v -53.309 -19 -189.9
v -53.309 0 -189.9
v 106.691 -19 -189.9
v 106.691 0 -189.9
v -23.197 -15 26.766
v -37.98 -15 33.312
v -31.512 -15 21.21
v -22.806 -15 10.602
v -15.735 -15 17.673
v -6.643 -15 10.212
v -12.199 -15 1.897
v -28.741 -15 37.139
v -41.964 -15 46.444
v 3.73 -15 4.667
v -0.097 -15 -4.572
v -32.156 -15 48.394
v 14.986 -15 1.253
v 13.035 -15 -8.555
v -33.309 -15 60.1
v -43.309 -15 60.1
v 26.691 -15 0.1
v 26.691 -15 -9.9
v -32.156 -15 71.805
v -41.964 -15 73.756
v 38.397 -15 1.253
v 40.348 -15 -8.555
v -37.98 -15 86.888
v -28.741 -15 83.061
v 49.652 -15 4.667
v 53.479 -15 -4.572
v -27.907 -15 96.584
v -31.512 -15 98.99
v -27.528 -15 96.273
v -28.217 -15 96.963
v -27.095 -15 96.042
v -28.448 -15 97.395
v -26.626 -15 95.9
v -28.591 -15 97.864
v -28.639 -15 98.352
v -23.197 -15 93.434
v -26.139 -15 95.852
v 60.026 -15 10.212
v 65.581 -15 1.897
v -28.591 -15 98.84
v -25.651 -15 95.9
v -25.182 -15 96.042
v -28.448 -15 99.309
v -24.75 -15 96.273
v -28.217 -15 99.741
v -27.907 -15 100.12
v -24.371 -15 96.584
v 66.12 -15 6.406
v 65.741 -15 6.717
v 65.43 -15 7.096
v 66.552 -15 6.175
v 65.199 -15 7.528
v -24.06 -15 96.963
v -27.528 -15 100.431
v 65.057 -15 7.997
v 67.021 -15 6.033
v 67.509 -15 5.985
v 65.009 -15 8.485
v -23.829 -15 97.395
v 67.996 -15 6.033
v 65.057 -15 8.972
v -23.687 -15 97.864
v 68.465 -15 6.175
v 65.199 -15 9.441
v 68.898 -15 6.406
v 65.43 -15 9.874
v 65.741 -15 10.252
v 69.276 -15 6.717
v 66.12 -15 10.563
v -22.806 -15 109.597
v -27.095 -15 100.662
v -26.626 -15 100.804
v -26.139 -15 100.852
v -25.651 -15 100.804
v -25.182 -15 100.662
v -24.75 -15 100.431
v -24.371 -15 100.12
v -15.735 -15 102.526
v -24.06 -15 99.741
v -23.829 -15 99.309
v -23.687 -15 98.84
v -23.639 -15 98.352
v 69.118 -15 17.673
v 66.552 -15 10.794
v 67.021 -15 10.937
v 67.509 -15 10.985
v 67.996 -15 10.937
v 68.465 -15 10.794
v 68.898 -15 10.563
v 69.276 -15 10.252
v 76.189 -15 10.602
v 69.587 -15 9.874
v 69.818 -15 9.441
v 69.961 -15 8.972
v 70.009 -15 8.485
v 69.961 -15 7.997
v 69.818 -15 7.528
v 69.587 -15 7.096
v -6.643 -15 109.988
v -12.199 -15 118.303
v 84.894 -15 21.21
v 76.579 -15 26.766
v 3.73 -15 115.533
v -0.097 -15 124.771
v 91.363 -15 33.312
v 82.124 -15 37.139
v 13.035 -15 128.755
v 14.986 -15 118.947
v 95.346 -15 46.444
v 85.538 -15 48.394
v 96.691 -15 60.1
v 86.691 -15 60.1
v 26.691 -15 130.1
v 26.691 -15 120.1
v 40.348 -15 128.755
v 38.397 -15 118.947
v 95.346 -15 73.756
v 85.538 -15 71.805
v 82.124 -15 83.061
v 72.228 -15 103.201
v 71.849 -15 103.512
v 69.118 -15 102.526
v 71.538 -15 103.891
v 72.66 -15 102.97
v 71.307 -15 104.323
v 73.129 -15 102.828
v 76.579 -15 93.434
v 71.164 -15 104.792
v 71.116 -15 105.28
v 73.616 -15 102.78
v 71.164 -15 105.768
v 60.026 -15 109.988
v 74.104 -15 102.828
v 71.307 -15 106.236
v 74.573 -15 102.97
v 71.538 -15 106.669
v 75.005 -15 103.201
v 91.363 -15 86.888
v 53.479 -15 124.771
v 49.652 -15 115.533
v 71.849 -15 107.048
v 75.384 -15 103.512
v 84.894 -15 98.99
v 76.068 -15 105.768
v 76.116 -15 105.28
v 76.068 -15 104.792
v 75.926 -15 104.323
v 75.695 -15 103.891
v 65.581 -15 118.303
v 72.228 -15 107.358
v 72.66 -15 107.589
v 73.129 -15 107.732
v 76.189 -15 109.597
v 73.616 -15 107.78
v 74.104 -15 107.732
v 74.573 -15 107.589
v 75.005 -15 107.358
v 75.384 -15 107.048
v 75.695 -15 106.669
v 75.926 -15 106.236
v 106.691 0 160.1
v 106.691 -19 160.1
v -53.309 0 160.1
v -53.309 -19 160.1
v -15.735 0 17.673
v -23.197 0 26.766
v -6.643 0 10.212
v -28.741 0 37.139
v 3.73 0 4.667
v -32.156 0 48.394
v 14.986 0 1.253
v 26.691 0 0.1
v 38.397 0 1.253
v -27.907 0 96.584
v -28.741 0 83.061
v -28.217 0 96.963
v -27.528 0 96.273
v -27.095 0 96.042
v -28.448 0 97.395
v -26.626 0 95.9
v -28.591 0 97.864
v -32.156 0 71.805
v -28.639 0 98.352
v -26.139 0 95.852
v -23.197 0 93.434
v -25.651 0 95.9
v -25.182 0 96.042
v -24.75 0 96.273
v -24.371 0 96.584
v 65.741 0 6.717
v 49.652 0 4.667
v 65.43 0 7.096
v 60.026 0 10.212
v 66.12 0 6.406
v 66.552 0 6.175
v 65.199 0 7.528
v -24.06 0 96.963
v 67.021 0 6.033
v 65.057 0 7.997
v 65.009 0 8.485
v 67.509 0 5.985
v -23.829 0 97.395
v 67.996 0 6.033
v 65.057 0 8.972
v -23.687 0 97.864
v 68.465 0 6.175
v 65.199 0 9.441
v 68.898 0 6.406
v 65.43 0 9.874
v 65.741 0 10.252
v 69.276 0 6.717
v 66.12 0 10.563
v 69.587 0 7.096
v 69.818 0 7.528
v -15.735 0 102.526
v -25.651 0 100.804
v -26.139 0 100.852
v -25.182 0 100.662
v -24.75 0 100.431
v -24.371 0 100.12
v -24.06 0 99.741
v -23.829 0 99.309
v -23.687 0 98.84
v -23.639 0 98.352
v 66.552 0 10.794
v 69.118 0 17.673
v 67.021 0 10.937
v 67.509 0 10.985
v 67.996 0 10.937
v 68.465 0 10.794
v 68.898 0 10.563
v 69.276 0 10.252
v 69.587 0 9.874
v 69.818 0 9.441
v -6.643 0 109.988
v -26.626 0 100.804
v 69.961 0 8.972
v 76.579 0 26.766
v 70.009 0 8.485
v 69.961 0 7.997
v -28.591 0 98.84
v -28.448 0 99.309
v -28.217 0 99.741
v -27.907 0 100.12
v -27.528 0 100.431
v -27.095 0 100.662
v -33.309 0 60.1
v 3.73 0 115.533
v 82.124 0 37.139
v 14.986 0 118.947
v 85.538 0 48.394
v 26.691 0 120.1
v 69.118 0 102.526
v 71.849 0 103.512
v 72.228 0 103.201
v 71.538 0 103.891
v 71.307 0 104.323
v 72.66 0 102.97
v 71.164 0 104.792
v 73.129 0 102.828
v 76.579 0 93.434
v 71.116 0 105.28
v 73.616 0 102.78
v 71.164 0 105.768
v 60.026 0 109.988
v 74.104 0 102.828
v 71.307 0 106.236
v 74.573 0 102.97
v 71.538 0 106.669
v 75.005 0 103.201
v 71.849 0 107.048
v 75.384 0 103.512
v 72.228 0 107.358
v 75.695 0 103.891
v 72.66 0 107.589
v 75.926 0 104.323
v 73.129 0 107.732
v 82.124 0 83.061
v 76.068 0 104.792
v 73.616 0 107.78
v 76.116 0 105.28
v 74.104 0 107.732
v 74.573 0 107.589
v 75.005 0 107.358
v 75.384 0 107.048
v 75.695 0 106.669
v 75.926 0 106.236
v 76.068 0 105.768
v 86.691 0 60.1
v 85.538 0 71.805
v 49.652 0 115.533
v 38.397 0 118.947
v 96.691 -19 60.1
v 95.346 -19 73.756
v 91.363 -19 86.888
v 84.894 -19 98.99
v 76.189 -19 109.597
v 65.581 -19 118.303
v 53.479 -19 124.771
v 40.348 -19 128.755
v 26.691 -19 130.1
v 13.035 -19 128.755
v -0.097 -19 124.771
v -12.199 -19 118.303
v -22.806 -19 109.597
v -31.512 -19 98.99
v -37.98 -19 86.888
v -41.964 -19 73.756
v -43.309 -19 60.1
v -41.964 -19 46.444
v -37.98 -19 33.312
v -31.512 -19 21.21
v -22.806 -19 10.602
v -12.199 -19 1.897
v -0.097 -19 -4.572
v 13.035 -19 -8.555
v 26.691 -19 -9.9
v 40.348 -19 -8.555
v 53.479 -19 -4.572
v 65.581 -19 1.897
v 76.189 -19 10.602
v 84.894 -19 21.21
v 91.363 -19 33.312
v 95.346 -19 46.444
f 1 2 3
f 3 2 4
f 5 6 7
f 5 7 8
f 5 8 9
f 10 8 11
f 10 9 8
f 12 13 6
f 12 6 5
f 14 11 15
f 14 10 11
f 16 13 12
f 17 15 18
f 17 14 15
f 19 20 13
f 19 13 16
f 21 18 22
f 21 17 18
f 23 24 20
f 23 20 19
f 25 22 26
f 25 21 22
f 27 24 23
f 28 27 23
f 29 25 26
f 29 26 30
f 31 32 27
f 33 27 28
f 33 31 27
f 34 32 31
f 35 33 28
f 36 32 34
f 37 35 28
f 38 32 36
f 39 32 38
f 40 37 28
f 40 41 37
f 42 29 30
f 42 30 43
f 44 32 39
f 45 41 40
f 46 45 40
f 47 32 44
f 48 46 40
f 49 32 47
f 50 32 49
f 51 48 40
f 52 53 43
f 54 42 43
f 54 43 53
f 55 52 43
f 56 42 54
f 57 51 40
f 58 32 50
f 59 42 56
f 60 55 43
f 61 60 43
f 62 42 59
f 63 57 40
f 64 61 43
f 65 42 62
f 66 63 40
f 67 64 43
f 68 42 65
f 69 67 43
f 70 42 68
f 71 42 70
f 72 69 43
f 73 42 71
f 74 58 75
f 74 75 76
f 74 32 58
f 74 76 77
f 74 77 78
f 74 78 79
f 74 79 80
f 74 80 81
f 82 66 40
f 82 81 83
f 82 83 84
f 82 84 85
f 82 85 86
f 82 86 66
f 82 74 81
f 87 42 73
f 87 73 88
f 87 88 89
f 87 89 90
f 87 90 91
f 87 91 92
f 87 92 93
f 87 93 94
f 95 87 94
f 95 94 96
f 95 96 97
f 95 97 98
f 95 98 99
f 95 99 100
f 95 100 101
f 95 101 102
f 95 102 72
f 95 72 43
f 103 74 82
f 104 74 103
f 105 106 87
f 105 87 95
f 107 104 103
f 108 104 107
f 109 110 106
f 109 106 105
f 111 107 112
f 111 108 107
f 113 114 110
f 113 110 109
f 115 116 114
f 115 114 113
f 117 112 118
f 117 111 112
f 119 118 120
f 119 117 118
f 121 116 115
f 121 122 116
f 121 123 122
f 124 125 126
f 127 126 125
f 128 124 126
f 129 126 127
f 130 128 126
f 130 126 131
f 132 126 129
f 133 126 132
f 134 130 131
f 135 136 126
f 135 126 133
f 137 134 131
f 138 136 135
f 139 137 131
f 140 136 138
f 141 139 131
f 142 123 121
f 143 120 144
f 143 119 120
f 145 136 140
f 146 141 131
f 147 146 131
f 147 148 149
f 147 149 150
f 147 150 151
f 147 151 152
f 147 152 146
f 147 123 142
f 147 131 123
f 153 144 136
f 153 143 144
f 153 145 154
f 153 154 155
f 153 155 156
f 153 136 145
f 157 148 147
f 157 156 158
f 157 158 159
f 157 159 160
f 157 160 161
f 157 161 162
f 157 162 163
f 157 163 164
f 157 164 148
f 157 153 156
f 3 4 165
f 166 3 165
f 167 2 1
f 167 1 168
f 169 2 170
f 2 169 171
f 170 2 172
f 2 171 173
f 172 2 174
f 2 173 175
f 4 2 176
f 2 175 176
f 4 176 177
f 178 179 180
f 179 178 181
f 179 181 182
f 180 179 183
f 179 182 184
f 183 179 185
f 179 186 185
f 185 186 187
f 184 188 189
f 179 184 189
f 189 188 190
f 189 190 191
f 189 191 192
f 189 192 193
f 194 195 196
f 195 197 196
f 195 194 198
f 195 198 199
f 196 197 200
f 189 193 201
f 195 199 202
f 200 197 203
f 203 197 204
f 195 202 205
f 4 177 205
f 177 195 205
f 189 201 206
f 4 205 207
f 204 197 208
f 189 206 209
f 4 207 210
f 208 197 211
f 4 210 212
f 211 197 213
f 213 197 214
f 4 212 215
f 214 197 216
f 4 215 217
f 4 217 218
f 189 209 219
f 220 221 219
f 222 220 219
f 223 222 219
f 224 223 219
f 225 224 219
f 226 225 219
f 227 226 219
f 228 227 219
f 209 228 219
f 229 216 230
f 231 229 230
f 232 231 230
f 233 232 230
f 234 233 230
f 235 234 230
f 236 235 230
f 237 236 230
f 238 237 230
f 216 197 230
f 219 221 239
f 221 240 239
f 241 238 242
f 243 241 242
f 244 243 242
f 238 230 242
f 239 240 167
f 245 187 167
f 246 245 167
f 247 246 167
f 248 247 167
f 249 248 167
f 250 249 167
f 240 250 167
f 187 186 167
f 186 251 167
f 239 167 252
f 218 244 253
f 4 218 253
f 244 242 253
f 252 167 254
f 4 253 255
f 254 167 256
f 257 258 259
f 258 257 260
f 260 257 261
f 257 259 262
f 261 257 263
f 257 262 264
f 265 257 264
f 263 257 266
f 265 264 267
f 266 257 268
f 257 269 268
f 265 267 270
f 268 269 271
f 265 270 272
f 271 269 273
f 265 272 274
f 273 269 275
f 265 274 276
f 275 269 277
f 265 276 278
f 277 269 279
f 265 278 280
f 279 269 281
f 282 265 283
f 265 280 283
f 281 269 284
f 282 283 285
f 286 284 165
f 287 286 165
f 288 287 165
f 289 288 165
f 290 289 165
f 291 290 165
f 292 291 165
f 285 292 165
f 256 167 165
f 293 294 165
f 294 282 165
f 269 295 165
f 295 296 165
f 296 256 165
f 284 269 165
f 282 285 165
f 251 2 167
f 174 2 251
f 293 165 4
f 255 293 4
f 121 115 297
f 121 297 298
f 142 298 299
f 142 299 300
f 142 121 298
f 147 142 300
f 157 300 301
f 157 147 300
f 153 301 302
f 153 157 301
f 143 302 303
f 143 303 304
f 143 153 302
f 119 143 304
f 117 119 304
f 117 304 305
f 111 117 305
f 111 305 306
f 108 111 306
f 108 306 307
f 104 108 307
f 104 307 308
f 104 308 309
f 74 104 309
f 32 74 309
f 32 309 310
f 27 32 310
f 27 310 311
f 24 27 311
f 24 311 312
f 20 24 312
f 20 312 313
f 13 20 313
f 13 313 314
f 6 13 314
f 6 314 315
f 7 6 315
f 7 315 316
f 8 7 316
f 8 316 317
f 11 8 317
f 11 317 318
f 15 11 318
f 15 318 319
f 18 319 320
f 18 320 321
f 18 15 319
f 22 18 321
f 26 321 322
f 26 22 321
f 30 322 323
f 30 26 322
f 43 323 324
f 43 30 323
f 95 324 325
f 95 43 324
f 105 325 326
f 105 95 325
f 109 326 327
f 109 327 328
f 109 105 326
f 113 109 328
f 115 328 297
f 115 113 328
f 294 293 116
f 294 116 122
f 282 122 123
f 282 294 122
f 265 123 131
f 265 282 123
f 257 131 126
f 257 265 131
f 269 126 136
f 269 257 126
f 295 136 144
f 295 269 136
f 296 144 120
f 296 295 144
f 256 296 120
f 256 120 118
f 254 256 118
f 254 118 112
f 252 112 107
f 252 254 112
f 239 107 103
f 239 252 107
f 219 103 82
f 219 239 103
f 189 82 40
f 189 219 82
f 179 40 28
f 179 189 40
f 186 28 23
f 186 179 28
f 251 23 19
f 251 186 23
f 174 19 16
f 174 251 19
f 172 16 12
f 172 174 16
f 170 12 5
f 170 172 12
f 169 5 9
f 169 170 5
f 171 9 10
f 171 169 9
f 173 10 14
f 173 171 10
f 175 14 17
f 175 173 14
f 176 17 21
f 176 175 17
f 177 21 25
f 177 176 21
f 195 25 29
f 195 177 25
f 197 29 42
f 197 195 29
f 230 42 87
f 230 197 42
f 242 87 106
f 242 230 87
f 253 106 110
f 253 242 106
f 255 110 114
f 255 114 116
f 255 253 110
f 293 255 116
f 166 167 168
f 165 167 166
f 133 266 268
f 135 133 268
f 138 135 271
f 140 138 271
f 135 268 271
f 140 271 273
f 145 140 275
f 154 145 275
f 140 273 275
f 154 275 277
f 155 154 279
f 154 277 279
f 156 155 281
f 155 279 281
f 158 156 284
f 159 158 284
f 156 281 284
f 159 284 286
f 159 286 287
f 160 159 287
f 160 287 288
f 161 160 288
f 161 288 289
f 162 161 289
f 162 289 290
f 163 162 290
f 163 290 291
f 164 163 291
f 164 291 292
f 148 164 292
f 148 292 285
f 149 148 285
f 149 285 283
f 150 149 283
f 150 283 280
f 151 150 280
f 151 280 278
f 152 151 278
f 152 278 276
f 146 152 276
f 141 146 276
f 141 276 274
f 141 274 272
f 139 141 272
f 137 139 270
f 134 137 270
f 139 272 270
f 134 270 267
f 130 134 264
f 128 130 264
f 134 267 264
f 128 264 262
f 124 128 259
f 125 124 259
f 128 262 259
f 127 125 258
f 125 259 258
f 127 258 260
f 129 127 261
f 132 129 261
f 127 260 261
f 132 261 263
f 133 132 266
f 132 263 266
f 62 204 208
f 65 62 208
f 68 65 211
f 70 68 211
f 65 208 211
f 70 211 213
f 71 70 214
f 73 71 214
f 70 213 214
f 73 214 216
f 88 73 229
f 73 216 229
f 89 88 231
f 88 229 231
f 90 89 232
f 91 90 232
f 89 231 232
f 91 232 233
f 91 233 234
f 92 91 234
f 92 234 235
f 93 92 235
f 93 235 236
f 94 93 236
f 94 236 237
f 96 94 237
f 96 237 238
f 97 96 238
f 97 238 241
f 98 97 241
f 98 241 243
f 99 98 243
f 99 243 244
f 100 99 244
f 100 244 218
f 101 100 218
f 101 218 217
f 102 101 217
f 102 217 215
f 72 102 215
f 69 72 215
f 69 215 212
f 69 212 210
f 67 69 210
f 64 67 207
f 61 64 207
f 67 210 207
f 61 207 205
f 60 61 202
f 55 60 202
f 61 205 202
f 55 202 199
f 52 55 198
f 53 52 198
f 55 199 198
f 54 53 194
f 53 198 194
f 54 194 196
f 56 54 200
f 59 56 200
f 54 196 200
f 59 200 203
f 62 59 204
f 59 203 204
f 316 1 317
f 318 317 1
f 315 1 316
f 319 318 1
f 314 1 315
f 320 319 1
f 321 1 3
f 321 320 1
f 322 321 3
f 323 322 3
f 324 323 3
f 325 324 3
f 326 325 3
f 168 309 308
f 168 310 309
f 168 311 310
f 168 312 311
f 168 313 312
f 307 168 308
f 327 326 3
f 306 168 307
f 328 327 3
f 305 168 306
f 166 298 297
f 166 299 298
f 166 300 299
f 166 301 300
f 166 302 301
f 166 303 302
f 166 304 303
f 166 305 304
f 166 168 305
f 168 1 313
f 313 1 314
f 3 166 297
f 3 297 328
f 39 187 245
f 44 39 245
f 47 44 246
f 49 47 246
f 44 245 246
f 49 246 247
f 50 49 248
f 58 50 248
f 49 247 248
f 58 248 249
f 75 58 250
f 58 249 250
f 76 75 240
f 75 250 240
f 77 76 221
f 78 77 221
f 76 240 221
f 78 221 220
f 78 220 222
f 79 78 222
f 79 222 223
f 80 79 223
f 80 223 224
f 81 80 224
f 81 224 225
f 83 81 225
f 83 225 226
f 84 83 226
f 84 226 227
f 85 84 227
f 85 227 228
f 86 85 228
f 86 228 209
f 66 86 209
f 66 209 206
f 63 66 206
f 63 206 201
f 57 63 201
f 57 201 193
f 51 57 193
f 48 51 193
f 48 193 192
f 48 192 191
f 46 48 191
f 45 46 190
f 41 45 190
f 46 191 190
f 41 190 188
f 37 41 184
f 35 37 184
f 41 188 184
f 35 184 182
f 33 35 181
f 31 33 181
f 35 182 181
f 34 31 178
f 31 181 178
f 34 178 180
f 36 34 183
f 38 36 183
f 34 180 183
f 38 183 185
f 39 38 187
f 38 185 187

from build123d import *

# Parameters (mm, degrees)
F0_R     = 70
F0_R_2   = 60
F1_DEPTH = 15
F0_W     = 160
F0_H     = 350
F2_DEPTH = 19
F4_D     = 5


with BuildPart() as f1:
    # F0 (on Front) → F1 (new body)
    with BuildSketch(Plane.XZ):
        with Locations((26.691287, 60.099899)):
            Circle(F0_R)
        with Locations((26.691287, 60.099899)):
            Circle(F0_R_2, mode=Mode.SUBTRACT)
    extrude(amount=F1_DEPTH)

    # F0 (on Front) → F2 (join)
    with BuildSketch(Plane.XZ):
        with Locations((26.691287, -14.900101)):
            Rectangle(F0_W, F0_H)
        with Locations((26.691287, 60.099899)):
            Circle(F0_R, mode=Mode.SUBTRACT)
    extrude(amount=F2_DEPTH)

    # F4 (through all)
    with Locations(Plane.XZ.offset(15)):
        with Locations((-26.138766, 98.351955), (73.61643, 105.279788), (67.508727, 8.484681)):
            Hole(F4_D / 2)


solid = f1.part
